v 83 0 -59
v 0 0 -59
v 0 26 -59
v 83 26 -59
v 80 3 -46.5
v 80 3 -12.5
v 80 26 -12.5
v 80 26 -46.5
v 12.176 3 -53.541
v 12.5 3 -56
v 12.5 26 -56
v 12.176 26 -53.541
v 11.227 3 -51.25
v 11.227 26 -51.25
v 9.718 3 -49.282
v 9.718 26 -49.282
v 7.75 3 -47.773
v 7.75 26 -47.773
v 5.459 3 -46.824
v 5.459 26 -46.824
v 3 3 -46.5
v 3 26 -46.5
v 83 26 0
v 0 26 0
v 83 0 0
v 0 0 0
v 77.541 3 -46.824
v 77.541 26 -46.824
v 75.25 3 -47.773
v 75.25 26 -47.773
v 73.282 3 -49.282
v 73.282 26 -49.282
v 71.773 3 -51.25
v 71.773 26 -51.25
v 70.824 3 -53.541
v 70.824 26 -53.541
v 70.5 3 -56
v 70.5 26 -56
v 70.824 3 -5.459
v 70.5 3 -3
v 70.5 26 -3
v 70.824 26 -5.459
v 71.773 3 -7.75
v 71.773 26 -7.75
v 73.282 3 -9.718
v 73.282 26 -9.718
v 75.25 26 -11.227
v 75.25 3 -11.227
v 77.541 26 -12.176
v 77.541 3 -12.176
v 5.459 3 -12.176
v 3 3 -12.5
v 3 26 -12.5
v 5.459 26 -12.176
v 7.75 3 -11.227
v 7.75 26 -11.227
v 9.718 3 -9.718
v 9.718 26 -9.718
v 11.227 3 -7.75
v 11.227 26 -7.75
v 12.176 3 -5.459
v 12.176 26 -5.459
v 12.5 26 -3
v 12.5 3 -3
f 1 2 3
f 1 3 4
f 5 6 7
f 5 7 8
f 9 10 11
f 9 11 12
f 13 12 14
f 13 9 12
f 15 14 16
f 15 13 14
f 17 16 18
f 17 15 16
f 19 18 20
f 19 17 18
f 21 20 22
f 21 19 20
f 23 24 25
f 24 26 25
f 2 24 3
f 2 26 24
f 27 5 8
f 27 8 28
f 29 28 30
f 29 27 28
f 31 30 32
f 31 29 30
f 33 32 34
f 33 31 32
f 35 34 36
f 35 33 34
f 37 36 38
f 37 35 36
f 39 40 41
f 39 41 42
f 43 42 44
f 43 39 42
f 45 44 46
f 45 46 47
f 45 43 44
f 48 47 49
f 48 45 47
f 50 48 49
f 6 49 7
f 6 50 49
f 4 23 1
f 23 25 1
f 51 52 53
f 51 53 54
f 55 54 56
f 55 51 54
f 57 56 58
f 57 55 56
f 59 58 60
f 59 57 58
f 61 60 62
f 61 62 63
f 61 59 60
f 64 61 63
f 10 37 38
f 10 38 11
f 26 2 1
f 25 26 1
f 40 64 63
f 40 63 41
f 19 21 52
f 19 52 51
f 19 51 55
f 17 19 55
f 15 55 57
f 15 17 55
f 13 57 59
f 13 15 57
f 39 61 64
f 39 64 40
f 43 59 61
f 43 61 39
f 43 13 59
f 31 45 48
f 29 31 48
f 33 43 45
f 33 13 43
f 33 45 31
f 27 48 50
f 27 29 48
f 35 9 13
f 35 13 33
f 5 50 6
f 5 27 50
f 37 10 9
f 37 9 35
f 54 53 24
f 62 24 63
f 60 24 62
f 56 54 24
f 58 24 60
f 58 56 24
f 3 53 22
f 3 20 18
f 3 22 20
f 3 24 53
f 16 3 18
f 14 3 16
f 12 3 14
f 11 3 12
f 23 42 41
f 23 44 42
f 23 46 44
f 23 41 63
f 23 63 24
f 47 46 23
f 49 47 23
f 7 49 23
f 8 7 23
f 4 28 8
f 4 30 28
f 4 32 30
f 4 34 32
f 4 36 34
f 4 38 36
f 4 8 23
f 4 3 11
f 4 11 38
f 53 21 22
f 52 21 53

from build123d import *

# Parameters (mm, degrees)
SKETCH1_W           = 83
SKETCH1_H           = 59
BOSS_EXTRUDE1_DEPTH = 3
SKETCH2_W           = 83
SKETCH2_H           = 59
BOSS_EXTRUDE2_DEPTH = 23


with BuildPart() as part:
    # Sketch1 → Boss-Extrude1 (new body)
    with BuildSketch(Plane(origin=(0, 0, 0), x_dir=(1, 0, 0), z_dir=(0, 1, 0))):
        with Locations((41.5, 29.5)):
            Rectangle(SKETCH1_W, SKETCH1_H)
    extrude(amount=BOSS_EXTRUDE1_DEPTH)

    # Sketch2 → Boss-Extrude2 (add)
    with BuildSketch(Plane(origin=(0, 3, 0), x_dir=(1, 0, 0), z_dir=(0, 1, 0))):
        with Locations((41.5, 29.5)):
            Rectangle(SKETCH2_W, SKETCH2_H)
        with BuildLine():
            Line((3, 46.5), (3, 12.5))
            ThreePointArc((3, 12.5), (9.717514421, 9.717514421), (12.5, 3))
            Line((12.5, 3), (70.5, 3))
            ThreePointArc((70.5, 3), (73.282485579, 9.717514421), (80, 12.5))
            Line((80, 12.5), (80, 46.5))
            ThreePointArc((80, 46.5), (73.282485579, 49.282485579), (70.5, 56))
            Line((70.5, 56), (12.5, 56))
            ThreePointArc((12.5, 56), (9.717514421, 49.282485579), (3, 46.5))
        make_face(mode=Mode.SUBTRACT)
    extrude(amount=BOSS_EXTRUDE2_DEPTH)


solid = part.part
